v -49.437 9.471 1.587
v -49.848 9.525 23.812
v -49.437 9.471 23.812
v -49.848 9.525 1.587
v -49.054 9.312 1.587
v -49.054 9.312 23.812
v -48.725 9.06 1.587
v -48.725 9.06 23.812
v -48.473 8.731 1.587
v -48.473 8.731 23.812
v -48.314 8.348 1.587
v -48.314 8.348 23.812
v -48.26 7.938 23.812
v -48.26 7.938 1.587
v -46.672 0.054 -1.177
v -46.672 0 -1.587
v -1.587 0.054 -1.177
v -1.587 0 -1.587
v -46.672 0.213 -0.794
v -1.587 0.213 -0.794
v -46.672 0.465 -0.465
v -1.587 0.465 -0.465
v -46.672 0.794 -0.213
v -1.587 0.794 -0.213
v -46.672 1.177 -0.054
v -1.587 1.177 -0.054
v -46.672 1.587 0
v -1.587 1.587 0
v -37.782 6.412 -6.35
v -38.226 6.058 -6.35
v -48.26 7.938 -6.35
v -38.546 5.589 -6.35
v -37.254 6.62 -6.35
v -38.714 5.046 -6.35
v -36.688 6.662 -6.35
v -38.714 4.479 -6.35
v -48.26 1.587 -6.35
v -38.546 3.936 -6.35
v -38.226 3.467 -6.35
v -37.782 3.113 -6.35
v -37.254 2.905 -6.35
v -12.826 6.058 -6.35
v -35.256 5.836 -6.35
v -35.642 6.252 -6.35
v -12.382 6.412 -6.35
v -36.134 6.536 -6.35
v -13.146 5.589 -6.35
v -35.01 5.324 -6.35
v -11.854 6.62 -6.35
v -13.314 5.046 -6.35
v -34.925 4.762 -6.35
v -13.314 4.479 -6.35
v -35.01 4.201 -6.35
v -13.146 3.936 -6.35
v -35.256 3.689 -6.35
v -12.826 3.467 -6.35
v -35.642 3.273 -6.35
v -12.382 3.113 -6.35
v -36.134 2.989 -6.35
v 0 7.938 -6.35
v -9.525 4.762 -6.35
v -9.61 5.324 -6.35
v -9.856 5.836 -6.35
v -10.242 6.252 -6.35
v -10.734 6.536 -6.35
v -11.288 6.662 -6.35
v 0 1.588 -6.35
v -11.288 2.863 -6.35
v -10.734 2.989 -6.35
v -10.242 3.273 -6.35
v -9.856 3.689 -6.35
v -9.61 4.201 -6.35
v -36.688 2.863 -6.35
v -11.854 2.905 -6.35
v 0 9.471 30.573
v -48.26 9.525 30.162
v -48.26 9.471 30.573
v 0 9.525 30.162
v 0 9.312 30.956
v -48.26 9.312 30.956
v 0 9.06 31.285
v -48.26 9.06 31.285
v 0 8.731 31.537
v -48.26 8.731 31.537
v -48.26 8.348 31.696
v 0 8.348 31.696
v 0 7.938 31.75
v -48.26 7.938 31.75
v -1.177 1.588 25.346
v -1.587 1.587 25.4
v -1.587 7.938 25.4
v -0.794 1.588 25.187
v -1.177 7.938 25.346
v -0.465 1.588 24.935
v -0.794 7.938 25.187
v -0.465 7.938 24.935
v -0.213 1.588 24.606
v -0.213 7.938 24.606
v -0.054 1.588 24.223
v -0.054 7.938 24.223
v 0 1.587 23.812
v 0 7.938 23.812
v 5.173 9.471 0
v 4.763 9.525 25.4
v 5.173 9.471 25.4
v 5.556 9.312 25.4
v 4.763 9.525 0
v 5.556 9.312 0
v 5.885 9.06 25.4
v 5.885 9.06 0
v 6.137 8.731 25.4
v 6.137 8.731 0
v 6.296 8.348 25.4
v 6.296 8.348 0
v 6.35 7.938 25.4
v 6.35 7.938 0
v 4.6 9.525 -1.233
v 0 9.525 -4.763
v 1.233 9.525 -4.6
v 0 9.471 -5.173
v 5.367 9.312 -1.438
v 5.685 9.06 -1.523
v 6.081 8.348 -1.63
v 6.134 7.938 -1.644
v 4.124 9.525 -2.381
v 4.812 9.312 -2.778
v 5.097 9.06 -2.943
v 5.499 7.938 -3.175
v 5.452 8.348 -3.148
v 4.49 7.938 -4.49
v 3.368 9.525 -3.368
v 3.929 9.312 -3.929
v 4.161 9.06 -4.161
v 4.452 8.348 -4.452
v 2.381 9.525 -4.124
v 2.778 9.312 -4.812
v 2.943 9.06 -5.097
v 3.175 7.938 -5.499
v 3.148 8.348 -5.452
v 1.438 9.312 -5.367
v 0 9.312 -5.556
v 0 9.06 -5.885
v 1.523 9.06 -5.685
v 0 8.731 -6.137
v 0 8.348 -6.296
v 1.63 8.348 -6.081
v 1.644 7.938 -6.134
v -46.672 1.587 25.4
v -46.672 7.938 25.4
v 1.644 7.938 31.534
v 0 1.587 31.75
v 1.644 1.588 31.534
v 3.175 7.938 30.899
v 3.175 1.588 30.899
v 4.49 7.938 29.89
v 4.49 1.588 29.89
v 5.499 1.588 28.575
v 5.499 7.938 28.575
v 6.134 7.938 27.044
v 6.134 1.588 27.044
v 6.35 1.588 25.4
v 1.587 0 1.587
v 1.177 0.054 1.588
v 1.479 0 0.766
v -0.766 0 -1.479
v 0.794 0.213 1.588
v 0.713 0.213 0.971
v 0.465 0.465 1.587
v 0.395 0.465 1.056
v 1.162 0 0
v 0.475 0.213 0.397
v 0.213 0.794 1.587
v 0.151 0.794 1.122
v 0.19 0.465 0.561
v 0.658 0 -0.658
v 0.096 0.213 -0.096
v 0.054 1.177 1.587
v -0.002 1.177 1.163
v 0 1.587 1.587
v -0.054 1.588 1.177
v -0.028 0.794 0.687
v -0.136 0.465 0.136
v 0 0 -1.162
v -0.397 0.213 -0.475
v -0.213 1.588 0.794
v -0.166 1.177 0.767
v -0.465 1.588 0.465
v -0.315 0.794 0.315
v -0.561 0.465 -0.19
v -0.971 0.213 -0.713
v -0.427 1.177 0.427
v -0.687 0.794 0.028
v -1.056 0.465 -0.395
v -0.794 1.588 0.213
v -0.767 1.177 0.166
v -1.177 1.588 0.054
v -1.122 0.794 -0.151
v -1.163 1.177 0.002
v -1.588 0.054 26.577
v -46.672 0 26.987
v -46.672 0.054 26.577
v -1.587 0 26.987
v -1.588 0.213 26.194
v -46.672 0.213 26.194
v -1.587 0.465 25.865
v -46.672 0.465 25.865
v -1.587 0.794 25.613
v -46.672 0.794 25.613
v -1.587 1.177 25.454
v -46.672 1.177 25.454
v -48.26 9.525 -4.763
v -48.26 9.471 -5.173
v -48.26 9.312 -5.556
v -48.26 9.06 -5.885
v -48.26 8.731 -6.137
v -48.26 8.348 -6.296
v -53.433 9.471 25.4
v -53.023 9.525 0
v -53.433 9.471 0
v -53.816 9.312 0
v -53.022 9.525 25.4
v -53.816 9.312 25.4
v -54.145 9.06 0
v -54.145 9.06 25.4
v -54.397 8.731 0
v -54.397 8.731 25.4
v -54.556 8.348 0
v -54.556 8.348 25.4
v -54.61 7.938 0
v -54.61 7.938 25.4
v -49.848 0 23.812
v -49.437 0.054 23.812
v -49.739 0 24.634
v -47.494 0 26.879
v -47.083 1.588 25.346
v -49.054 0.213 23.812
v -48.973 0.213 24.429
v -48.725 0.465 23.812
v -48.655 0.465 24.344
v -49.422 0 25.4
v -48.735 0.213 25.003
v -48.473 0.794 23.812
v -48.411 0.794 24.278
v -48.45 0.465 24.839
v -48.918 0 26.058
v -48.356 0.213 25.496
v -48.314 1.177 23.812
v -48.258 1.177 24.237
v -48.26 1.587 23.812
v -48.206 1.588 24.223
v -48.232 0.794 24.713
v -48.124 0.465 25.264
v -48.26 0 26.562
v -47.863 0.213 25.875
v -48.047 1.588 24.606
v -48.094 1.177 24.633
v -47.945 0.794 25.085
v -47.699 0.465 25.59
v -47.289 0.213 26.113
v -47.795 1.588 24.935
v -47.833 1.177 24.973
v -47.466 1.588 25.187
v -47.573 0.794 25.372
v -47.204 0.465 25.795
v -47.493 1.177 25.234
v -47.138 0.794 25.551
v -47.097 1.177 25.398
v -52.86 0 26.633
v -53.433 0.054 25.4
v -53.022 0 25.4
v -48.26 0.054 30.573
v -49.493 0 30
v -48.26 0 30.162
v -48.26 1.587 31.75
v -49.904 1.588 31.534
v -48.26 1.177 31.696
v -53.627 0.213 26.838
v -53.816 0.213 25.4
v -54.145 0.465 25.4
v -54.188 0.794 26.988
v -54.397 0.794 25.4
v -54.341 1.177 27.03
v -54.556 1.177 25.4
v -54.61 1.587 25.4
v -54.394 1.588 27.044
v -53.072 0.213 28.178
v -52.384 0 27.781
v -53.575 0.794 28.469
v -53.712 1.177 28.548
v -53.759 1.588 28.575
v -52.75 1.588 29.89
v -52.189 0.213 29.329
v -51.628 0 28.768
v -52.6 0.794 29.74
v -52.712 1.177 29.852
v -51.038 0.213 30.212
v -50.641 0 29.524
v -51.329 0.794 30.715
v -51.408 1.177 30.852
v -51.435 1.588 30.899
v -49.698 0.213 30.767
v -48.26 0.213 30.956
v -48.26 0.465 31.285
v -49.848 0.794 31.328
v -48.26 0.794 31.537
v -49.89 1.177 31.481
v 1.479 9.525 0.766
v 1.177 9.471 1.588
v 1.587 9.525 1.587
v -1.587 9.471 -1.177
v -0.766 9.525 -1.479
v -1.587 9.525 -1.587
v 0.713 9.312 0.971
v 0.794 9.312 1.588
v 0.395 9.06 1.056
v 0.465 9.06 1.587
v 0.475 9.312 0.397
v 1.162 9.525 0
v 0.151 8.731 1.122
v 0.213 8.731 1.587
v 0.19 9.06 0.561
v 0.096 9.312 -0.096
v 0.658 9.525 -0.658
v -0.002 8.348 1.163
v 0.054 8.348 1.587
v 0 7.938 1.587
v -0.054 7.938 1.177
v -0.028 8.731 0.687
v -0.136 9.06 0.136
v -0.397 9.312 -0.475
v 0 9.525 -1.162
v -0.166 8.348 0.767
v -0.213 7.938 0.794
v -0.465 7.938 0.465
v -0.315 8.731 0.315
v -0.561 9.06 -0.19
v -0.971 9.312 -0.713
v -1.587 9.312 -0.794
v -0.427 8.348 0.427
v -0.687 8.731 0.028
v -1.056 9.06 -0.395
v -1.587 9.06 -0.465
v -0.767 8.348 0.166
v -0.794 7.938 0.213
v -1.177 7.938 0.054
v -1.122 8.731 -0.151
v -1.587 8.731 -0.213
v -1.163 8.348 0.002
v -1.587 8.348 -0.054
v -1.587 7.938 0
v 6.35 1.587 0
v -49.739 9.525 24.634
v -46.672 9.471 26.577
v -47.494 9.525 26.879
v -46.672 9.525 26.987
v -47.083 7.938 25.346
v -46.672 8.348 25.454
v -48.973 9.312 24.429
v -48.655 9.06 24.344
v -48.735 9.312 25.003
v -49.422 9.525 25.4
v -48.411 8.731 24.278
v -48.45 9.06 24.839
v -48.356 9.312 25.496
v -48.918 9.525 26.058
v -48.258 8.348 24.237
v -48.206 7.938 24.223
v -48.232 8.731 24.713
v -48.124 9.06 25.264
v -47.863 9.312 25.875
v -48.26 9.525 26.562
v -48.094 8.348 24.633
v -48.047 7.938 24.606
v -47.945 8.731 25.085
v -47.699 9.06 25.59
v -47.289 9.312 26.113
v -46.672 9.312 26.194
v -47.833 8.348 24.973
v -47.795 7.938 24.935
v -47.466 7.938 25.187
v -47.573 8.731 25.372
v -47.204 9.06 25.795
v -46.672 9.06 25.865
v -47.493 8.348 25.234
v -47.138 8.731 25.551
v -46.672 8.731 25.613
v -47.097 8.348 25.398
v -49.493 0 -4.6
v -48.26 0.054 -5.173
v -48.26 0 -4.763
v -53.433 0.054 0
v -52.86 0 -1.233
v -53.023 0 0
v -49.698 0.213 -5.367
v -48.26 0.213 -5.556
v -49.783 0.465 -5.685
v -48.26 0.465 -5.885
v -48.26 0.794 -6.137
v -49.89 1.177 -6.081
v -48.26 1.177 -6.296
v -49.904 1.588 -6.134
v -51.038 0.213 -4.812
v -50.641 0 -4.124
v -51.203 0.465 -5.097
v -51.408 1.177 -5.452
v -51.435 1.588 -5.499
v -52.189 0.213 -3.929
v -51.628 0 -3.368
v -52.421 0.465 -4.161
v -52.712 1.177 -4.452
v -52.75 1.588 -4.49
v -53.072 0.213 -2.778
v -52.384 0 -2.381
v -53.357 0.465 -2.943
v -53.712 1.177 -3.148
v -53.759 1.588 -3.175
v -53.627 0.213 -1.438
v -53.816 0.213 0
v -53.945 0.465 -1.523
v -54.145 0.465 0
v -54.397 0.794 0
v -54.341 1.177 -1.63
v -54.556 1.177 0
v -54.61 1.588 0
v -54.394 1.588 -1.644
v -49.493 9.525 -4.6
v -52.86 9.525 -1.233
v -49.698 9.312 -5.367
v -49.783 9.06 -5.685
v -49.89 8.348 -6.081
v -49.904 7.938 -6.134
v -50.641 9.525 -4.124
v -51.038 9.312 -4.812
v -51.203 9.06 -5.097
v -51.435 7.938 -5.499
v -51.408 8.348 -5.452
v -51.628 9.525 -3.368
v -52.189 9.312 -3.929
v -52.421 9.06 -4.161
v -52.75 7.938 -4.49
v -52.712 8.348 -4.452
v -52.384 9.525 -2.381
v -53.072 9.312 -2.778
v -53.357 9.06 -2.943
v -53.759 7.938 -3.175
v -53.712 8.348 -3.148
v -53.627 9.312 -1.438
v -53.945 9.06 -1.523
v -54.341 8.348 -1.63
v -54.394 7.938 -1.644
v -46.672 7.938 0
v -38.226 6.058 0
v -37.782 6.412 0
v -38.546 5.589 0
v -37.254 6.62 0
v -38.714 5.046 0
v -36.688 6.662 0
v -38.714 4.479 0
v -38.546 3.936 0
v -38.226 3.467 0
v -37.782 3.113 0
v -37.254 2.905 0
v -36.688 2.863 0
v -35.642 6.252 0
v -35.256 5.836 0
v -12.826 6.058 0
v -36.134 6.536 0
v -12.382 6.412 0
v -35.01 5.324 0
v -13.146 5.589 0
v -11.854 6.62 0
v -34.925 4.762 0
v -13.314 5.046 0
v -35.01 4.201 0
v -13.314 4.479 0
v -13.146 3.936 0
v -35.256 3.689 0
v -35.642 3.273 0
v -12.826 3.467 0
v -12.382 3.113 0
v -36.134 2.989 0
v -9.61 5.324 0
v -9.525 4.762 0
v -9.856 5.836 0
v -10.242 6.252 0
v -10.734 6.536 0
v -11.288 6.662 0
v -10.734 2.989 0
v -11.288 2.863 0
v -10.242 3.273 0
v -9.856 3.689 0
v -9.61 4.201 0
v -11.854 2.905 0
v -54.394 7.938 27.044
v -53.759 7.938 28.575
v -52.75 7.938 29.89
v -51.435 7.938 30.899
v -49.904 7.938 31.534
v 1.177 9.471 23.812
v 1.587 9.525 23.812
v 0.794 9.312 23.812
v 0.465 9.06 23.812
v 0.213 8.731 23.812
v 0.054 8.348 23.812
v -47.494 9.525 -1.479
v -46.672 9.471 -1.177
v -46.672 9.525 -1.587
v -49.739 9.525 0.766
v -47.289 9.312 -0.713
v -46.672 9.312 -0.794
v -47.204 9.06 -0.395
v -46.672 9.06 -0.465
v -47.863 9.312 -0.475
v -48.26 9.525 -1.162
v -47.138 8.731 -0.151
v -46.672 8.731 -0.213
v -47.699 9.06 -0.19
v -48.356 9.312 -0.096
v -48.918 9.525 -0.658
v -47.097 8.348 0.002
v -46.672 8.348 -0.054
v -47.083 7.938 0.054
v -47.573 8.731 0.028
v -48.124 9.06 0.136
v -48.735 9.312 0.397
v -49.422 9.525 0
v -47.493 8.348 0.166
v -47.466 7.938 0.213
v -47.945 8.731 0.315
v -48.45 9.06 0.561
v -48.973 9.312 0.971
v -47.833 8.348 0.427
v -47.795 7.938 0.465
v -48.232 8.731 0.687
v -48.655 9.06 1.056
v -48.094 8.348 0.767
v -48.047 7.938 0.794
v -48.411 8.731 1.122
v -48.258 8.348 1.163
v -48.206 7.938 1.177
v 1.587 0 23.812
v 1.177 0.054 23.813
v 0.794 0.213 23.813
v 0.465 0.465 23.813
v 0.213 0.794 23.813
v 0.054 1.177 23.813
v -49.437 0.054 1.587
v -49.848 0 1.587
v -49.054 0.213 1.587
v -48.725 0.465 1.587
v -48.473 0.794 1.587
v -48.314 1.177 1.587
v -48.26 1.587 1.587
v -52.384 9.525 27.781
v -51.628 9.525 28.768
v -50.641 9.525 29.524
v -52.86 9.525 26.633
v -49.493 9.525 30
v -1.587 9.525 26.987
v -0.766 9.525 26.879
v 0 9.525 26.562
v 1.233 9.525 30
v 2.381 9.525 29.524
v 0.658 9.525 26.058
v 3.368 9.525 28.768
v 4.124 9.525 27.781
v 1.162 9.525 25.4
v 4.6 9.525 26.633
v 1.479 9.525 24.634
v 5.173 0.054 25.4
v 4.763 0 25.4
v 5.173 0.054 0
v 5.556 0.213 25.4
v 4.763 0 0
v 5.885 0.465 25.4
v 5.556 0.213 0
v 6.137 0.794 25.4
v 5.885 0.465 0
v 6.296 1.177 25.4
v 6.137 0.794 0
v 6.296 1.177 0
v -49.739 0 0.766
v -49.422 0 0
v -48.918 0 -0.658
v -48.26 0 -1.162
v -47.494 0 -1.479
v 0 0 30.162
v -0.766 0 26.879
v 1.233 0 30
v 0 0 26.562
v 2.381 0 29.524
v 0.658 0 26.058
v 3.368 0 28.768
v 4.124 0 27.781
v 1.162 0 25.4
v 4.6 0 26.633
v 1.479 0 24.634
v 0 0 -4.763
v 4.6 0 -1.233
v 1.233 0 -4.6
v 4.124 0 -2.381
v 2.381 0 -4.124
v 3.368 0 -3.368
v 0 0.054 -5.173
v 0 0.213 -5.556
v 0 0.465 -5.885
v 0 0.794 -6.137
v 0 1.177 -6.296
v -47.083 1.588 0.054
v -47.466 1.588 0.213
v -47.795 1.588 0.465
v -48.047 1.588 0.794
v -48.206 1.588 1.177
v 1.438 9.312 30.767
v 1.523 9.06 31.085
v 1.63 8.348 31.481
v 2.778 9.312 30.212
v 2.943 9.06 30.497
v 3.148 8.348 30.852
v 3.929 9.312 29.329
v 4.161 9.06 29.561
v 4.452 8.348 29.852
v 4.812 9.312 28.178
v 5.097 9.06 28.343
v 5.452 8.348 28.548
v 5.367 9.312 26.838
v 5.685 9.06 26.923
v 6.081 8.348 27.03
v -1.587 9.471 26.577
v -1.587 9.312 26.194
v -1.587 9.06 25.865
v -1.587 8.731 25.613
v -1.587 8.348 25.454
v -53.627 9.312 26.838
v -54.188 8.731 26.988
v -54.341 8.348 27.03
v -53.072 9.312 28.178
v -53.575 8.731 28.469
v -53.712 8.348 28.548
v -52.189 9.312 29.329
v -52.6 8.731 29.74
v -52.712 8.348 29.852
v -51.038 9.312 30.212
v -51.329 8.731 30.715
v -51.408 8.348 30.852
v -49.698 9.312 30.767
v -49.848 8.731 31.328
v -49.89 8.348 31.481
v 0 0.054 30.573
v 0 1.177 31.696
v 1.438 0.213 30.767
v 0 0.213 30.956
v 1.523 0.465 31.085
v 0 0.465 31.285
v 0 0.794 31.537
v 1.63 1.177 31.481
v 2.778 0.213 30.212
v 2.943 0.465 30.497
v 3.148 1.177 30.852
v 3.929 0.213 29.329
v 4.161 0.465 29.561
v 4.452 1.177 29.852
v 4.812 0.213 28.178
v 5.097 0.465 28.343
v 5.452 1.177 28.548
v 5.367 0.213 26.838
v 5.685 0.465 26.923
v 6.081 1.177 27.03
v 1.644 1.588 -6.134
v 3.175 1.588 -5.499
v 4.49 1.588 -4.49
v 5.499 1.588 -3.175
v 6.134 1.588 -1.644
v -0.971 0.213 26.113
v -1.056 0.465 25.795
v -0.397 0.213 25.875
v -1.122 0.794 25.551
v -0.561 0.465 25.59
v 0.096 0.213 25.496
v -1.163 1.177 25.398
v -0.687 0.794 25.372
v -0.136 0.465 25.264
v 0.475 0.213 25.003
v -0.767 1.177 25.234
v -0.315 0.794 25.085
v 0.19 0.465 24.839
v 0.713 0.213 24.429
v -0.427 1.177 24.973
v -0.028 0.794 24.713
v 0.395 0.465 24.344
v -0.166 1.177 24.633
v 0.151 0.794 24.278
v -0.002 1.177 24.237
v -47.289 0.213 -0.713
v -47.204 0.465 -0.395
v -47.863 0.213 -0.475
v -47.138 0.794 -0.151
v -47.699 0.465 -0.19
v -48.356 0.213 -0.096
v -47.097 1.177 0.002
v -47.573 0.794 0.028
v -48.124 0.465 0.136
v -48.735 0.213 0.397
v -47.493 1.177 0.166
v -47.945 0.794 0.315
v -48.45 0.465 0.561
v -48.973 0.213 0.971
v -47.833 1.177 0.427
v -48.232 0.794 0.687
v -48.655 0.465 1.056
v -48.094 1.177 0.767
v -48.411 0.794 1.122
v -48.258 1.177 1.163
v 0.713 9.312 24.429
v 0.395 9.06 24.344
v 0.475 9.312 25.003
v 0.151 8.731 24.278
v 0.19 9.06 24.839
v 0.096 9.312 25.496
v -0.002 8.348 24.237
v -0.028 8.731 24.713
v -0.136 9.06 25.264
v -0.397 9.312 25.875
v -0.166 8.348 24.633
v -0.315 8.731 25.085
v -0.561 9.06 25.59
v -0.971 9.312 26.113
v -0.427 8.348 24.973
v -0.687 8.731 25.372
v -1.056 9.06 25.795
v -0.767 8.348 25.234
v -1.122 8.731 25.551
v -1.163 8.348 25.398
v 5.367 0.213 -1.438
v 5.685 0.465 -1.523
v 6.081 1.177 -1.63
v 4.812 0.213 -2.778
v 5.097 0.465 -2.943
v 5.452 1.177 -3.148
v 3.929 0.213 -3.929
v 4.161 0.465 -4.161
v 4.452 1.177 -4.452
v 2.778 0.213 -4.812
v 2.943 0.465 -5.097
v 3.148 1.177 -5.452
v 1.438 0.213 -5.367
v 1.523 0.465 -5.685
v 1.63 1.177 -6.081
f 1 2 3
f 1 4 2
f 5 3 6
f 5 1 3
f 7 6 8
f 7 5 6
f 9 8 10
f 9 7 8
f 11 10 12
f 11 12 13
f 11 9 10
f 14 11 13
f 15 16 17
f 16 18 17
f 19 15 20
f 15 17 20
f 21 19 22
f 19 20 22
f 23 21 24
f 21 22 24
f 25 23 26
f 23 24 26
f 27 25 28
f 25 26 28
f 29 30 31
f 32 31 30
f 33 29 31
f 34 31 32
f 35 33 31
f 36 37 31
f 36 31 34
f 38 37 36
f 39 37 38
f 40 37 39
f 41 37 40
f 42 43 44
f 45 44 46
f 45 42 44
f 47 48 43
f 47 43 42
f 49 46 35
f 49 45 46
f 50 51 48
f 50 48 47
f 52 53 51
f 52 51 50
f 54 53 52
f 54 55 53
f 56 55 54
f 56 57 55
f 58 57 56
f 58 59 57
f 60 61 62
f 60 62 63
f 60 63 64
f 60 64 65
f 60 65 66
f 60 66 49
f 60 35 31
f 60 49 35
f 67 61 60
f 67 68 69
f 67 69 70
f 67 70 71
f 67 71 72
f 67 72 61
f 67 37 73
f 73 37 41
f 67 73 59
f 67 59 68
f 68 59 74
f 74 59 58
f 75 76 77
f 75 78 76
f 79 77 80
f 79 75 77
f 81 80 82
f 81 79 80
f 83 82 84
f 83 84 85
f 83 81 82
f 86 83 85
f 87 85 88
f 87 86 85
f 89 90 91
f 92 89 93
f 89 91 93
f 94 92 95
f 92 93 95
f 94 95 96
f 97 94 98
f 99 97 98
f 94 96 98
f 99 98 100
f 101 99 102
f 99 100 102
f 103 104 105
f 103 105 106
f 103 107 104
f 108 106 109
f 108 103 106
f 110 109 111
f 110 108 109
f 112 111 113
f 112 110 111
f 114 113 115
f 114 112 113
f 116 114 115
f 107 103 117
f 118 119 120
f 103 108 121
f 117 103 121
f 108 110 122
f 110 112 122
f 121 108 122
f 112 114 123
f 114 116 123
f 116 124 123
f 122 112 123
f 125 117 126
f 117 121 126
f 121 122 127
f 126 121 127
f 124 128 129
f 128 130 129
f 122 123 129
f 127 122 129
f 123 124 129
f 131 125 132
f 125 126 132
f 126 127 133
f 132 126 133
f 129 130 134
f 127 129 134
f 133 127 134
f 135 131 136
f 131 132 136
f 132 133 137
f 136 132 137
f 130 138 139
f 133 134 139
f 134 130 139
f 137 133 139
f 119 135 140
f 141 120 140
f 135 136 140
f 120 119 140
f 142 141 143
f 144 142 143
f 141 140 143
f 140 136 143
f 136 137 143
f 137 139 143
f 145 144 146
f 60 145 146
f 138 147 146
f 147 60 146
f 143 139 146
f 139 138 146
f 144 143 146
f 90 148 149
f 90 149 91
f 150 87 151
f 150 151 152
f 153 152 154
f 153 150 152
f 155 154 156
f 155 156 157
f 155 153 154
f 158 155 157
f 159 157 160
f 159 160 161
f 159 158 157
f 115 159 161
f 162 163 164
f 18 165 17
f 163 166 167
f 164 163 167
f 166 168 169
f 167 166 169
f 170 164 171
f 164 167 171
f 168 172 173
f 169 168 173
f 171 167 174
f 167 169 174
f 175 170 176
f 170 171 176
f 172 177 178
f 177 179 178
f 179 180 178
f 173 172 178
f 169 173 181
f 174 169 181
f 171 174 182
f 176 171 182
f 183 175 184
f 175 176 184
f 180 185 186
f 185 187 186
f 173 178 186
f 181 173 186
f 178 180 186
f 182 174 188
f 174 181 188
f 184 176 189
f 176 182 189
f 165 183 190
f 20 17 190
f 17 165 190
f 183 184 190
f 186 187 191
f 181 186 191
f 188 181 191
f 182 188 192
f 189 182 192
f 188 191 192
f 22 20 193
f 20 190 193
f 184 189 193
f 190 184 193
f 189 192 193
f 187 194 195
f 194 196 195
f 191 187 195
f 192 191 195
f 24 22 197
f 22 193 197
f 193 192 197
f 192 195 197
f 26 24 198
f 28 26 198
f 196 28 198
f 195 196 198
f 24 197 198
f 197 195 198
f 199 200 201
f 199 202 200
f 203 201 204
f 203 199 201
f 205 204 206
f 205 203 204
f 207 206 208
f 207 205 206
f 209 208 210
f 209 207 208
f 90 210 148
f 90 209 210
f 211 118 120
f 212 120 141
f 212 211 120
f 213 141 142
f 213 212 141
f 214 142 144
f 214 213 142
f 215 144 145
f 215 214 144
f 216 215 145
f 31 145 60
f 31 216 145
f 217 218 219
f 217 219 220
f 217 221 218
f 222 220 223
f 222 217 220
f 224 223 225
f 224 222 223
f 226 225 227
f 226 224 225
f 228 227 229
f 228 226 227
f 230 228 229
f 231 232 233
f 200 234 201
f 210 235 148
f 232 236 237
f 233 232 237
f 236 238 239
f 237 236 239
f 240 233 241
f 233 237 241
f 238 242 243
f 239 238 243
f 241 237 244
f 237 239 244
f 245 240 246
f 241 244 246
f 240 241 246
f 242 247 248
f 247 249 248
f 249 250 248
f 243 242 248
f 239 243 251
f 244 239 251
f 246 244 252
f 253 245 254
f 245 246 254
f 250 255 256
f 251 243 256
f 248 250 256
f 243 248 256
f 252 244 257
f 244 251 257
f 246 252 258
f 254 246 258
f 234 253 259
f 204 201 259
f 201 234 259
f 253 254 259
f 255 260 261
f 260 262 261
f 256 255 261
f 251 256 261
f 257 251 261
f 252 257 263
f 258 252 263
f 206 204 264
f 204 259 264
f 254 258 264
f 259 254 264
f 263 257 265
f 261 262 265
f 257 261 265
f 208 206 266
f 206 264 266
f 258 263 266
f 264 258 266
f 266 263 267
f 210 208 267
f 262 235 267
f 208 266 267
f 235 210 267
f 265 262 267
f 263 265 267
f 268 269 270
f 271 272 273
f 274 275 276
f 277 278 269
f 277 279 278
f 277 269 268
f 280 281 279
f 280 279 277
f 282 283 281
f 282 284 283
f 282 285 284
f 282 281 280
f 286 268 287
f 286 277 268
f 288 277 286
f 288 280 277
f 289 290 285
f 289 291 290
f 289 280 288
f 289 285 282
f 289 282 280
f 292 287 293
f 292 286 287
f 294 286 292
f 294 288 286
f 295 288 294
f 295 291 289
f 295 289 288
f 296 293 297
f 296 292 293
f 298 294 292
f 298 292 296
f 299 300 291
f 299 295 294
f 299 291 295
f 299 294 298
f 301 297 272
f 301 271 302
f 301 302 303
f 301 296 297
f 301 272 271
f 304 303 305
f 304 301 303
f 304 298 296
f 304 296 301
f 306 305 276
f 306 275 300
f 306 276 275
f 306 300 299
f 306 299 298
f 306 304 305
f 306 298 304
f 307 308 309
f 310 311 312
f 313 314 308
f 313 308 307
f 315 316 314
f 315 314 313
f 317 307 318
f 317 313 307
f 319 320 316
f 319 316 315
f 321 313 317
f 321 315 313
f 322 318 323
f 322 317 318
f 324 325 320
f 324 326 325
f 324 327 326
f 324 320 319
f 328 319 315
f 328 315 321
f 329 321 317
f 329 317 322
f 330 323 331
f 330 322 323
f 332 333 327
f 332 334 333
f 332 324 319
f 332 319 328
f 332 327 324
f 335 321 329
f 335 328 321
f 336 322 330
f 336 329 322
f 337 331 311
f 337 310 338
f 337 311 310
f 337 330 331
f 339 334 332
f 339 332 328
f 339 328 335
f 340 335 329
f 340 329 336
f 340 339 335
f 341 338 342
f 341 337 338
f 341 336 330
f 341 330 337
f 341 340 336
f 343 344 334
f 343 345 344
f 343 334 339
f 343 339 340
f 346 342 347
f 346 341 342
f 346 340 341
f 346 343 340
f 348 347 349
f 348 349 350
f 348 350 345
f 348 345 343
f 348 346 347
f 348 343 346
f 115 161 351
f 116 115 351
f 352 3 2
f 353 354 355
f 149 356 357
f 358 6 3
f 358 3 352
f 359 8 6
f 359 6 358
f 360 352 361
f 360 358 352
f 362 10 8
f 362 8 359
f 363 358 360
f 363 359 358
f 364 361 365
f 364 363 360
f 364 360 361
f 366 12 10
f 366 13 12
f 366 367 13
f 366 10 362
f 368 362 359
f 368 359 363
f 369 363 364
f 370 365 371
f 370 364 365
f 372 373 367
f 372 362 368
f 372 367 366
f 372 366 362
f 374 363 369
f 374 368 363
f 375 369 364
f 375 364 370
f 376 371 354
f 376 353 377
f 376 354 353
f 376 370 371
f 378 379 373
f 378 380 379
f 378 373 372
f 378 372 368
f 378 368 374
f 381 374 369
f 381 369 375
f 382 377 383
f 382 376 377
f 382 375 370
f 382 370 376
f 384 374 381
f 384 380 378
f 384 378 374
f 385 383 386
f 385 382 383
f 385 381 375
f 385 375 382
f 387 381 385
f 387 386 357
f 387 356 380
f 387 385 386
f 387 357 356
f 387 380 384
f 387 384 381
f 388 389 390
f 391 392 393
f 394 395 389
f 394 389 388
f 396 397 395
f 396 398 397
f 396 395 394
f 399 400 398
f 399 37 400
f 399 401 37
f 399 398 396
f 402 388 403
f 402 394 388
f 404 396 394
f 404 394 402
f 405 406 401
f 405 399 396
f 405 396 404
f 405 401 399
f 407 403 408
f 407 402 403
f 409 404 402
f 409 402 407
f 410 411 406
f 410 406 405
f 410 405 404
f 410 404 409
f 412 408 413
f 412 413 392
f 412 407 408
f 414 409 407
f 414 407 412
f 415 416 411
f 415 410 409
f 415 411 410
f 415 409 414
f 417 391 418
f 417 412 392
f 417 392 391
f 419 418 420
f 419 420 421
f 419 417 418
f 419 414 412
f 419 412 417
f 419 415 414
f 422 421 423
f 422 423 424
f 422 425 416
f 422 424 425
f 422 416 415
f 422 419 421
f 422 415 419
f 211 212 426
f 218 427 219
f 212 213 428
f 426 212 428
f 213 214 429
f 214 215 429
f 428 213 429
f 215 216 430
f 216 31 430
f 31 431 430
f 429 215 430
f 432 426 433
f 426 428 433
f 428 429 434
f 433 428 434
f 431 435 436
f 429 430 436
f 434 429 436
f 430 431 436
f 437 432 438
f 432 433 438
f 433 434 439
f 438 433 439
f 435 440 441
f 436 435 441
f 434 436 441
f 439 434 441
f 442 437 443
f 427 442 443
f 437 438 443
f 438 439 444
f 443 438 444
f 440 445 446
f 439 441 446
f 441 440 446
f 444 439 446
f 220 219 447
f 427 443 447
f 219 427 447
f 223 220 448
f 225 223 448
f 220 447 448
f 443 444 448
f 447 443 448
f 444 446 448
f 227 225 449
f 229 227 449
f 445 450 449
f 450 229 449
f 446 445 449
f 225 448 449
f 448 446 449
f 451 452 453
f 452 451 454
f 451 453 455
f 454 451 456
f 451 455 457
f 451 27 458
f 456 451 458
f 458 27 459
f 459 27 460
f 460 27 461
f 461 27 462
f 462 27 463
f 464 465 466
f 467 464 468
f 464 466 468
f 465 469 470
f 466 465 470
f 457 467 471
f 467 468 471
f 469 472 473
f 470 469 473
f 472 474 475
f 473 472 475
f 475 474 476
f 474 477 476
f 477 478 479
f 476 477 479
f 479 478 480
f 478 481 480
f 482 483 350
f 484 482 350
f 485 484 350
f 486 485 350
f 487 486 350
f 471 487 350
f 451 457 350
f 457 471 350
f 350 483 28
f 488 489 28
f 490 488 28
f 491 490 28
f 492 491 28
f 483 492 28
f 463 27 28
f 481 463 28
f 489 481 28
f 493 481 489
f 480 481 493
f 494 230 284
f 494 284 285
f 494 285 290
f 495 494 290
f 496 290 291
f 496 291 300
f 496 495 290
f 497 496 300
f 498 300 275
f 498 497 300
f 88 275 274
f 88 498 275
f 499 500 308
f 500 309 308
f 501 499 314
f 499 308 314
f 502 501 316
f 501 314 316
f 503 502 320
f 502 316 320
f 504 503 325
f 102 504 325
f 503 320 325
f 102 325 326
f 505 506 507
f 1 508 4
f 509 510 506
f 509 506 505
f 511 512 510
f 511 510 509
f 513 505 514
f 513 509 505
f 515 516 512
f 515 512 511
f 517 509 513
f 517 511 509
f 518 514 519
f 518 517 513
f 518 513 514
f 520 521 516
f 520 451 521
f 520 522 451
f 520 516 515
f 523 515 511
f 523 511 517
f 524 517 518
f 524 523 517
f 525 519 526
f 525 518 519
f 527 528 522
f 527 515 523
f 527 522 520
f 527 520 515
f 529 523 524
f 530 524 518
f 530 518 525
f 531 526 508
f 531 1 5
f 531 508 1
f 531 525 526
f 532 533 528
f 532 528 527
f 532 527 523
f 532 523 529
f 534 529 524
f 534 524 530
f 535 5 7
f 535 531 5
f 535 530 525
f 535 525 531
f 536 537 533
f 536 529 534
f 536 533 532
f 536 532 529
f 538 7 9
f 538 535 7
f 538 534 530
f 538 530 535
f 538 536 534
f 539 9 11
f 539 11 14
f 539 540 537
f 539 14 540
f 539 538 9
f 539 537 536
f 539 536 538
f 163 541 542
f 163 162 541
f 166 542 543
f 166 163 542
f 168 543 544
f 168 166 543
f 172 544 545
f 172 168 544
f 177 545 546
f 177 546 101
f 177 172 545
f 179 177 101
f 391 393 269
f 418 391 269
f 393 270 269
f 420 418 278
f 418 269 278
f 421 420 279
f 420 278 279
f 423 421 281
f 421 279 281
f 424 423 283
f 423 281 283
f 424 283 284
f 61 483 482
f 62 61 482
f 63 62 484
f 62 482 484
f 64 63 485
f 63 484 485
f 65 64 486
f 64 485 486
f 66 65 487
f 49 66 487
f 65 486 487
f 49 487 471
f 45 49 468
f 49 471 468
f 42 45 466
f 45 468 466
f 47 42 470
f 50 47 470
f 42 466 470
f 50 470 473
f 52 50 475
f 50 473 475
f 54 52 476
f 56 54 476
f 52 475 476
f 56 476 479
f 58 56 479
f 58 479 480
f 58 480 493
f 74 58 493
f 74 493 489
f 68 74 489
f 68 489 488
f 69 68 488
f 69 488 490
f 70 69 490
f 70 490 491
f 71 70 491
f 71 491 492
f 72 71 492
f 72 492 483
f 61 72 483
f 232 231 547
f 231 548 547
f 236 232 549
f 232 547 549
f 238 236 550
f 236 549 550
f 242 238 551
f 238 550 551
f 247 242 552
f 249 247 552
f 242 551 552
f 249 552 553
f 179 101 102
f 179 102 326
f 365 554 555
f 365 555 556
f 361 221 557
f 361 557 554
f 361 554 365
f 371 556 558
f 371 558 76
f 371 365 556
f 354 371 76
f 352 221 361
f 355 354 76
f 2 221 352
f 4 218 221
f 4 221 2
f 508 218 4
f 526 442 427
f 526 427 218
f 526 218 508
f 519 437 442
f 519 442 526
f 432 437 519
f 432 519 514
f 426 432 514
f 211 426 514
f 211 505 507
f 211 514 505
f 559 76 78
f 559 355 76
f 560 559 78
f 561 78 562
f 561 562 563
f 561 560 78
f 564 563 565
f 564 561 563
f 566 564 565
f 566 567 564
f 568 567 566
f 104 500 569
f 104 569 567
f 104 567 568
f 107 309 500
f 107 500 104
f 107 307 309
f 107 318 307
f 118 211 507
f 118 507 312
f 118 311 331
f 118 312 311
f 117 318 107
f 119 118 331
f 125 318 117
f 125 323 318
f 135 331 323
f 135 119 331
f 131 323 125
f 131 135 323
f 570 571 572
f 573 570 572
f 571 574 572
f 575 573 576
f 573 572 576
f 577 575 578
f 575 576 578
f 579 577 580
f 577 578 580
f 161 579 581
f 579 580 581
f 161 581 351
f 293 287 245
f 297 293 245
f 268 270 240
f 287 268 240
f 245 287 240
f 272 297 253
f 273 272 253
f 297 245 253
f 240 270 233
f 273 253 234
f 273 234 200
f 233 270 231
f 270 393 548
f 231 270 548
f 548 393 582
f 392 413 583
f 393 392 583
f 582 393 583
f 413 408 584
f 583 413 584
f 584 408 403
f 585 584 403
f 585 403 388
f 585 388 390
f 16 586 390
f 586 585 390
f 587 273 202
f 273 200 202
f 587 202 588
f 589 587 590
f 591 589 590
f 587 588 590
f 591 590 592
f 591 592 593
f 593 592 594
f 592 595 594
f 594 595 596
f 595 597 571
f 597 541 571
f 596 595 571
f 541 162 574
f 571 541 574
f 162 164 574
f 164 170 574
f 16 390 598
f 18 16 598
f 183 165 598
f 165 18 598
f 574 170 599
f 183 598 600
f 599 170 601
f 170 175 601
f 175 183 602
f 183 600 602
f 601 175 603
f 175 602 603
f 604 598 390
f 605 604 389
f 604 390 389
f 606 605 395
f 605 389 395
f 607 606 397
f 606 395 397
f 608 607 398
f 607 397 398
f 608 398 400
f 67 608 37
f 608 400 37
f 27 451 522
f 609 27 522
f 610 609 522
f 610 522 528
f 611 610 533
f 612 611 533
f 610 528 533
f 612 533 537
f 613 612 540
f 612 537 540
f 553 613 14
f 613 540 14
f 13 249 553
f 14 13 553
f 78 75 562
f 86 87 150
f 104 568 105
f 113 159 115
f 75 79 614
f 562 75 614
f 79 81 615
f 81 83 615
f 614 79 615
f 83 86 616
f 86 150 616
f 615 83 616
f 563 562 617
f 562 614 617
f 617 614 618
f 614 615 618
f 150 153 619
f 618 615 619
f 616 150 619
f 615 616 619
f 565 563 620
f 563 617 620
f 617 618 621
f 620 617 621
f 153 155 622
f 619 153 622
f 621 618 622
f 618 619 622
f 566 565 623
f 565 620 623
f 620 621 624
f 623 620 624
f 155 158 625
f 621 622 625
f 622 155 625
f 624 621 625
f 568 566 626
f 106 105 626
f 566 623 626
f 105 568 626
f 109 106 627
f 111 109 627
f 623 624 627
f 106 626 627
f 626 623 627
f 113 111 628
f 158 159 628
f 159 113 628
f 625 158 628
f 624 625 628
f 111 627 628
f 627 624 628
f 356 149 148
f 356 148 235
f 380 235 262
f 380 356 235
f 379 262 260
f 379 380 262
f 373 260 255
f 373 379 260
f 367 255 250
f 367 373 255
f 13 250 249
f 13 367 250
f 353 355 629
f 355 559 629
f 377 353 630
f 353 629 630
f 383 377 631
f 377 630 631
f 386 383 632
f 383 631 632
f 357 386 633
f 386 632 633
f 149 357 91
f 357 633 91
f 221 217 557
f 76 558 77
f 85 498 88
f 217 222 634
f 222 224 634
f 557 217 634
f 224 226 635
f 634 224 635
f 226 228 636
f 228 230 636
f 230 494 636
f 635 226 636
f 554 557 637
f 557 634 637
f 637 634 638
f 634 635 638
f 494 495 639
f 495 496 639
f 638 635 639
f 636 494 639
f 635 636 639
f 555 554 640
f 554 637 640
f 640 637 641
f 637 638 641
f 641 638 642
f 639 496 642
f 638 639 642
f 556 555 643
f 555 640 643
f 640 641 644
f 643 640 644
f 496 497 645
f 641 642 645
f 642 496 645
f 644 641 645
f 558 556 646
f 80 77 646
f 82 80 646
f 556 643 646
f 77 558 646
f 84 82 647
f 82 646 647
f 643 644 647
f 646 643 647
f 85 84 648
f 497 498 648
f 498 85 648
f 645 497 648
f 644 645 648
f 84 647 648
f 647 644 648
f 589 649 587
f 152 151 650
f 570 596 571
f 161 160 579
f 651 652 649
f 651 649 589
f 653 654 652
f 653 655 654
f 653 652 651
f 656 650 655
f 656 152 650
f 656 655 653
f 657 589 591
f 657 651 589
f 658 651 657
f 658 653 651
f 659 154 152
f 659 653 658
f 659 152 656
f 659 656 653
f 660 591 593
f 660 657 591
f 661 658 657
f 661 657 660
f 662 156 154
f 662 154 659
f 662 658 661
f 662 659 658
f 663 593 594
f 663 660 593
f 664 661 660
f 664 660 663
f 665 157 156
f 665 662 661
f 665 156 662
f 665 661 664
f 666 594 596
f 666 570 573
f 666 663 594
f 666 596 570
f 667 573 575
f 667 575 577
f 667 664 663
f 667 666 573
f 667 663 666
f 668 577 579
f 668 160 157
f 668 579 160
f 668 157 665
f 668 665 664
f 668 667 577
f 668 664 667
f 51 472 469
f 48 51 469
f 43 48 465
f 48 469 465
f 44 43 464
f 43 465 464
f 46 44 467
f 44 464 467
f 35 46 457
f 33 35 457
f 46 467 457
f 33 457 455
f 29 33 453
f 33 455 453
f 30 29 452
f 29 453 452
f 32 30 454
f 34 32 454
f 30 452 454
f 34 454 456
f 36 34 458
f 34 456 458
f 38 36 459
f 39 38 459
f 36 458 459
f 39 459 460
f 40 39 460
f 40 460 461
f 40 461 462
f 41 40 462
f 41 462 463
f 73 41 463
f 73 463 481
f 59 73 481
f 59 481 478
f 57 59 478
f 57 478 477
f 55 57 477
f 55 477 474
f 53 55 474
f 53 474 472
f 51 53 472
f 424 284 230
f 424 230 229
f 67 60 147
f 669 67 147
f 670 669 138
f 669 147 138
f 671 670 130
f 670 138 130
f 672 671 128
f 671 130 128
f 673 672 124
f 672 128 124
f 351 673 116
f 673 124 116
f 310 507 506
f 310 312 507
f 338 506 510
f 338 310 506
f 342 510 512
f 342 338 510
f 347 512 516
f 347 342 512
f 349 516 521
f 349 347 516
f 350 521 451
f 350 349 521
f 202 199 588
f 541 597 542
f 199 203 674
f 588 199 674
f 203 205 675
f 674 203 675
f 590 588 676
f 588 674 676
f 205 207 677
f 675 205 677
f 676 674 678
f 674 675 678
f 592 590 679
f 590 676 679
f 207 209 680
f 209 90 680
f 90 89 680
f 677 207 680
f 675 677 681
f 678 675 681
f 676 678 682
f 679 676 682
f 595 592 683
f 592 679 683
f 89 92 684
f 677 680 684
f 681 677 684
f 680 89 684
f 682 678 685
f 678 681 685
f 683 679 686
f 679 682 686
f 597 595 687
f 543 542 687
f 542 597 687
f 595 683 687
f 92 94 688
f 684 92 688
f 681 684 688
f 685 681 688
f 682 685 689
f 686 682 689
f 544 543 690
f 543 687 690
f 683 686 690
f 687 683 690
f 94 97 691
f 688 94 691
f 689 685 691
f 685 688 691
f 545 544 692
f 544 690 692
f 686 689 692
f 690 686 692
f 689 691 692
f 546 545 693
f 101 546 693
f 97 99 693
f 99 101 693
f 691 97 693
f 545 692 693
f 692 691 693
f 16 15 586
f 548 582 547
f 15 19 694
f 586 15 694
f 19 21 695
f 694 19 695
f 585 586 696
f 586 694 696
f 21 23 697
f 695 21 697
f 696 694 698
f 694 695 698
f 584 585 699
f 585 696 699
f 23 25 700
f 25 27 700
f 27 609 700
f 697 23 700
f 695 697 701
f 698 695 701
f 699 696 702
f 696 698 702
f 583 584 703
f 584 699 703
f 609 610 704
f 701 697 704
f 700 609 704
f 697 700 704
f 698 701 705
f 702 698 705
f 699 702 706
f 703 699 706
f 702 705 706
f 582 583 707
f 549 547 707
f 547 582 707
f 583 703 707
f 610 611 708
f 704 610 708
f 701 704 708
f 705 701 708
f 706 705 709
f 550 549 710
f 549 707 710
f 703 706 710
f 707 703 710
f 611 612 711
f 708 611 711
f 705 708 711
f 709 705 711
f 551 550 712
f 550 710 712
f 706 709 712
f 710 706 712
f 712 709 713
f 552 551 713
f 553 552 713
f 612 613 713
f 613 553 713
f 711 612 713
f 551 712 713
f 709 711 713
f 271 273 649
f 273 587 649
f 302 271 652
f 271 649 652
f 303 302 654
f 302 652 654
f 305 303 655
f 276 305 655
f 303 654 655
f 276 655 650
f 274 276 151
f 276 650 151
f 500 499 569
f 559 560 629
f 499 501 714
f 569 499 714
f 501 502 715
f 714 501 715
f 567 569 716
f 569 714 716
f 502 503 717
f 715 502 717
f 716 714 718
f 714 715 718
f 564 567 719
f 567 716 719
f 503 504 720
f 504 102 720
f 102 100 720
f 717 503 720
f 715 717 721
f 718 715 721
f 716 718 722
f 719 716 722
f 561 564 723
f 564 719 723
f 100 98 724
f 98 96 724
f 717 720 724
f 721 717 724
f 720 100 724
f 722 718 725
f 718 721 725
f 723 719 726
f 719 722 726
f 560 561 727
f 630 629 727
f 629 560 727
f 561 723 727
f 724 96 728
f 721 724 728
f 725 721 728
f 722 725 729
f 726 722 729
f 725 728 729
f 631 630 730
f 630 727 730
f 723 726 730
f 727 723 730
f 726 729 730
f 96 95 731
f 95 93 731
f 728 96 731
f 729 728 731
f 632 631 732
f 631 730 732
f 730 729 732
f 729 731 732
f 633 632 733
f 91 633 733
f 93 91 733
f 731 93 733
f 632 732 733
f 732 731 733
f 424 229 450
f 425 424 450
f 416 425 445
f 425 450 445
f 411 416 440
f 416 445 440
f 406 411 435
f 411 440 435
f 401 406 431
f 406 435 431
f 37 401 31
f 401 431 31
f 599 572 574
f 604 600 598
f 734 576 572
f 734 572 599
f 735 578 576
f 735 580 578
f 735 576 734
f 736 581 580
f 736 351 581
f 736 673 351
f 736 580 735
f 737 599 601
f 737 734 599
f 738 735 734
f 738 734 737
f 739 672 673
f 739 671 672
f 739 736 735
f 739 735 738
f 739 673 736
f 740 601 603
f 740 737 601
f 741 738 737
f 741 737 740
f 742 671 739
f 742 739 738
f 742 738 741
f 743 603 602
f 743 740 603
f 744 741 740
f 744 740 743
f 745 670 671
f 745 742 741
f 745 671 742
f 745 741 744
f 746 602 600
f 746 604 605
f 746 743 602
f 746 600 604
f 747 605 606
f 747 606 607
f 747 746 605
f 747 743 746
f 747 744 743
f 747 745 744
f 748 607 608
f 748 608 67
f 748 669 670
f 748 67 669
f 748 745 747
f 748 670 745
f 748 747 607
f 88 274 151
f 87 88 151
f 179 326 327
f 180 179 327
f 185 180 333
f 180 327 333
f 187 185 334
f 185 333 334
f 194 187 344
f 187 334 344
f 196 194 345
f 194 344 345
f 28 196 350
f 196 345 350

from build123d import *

# Parameters (mm, degrees)
SKETCH1_W           = 60.96
SKETCH1_H           = 38.1
SKETCH1_W_2         = 48.26
SKETCH1_H_2         = 25.4
BOSS_EXTRUDE1_DEPTH = 9.525
SKETCH2_R           = 1.905
CUT_EXTRUDE1_DEPTH  = 64.883019849
FILLET1_R           = 6.35
FILLET2_R           = 1.5875


with BuildPart() as part:
    # Sketch1 → Boss-Extrude1 (new body)
    with BuildSketch(Plane(origin=(0, 0, 0), x_dir=(1, 0, 0), z_dir=(0, 1, 0))):
        with Locations((-24.13, -12.7)):
            Rectangle(SKETCH1_W, SKETCH1_H)
        with Locations((-24.13, -12.7)):
            Rectangle(SKETCH1_W_2, SKETCH1_H_2, mode=Mode.SUBTRACT)
    extrude(amount=BOSS_EXTRUDE1_DEPTH)

    # Sketch2 → Cut-Extrude1 (cut, through all)
    with BuildSketch(Plane.XY):
        with Locations((-36.83, 4.7625)):
            Circle(SKETCH2_R)
        with Locations((-11.43, 4.7625)):
            Circle(SKETCH2_R)
    extrude(amount=-CUT_EXTRUDE1_DEPTH, mode=Mode.SUBTRACT)

    # Fillet1
    fillet1_edges = [part.edges().sort_by_distance(p)[0] for p in [
        (-54.61, 4.7625, -6.35),
        (6.35, 4.7625, -6.35),
        (6.35, 4.7625, 31.75),
        (-54.61, 4.7625, 31.75),
    ]]
    fillet(fillet1_edges, radius=FILLET1_R)

    # Fillet2
    fillet2_edges = [part.edges().sort_by_distance(p)[0] for p in [
        (0, 0, 12.7),
        (0, 4.7625, 25.4),
        (-24.13, 0, 0),
        (0, 4.7625, 0),
        (-48.26, 0, 12.7),
        (-48.26, 4.7625, 0),
        (-24.13, 0, 25.4),
        (-48.26, 4.7625, 25.4),
        (0, 9.525, 12.7),
        (-24.13, 9.525, 0),
        (-48.26, 9.525, 12.7),
        (-24.13, 9.525, 25.4),
        (-24.13, 0, 31.75),
        (-24.13, 9.525, 31.75),
        (-54.61, 0, 12.7),
        (-24.13, 0, -6.35),
        (6.35, 0, 12.7),
        (4.490128061, 0, 29.890128061),
        (4.490128061, 0, -4.490128061),
        (-52.750128061, 0, -4.490128061),
        (-52.750128061, 0, 29.890128061),
        (-54.61, 9.525, 12.7),
        (6.35, 9.525, 12.7),
        (-24.13, 9.525, -6.35),
        (4.490128061, 9.525, 29.890128061),
        (4.490128061, 9.525, -4.490128061),
        (-52.750128061, 9.525, -4.490128061),
        (-52.750128061, 9.525, 29.890128061),
    ]]
    fillet(fillet2_edges, radius=FILLET2_R)


solid = part.part
